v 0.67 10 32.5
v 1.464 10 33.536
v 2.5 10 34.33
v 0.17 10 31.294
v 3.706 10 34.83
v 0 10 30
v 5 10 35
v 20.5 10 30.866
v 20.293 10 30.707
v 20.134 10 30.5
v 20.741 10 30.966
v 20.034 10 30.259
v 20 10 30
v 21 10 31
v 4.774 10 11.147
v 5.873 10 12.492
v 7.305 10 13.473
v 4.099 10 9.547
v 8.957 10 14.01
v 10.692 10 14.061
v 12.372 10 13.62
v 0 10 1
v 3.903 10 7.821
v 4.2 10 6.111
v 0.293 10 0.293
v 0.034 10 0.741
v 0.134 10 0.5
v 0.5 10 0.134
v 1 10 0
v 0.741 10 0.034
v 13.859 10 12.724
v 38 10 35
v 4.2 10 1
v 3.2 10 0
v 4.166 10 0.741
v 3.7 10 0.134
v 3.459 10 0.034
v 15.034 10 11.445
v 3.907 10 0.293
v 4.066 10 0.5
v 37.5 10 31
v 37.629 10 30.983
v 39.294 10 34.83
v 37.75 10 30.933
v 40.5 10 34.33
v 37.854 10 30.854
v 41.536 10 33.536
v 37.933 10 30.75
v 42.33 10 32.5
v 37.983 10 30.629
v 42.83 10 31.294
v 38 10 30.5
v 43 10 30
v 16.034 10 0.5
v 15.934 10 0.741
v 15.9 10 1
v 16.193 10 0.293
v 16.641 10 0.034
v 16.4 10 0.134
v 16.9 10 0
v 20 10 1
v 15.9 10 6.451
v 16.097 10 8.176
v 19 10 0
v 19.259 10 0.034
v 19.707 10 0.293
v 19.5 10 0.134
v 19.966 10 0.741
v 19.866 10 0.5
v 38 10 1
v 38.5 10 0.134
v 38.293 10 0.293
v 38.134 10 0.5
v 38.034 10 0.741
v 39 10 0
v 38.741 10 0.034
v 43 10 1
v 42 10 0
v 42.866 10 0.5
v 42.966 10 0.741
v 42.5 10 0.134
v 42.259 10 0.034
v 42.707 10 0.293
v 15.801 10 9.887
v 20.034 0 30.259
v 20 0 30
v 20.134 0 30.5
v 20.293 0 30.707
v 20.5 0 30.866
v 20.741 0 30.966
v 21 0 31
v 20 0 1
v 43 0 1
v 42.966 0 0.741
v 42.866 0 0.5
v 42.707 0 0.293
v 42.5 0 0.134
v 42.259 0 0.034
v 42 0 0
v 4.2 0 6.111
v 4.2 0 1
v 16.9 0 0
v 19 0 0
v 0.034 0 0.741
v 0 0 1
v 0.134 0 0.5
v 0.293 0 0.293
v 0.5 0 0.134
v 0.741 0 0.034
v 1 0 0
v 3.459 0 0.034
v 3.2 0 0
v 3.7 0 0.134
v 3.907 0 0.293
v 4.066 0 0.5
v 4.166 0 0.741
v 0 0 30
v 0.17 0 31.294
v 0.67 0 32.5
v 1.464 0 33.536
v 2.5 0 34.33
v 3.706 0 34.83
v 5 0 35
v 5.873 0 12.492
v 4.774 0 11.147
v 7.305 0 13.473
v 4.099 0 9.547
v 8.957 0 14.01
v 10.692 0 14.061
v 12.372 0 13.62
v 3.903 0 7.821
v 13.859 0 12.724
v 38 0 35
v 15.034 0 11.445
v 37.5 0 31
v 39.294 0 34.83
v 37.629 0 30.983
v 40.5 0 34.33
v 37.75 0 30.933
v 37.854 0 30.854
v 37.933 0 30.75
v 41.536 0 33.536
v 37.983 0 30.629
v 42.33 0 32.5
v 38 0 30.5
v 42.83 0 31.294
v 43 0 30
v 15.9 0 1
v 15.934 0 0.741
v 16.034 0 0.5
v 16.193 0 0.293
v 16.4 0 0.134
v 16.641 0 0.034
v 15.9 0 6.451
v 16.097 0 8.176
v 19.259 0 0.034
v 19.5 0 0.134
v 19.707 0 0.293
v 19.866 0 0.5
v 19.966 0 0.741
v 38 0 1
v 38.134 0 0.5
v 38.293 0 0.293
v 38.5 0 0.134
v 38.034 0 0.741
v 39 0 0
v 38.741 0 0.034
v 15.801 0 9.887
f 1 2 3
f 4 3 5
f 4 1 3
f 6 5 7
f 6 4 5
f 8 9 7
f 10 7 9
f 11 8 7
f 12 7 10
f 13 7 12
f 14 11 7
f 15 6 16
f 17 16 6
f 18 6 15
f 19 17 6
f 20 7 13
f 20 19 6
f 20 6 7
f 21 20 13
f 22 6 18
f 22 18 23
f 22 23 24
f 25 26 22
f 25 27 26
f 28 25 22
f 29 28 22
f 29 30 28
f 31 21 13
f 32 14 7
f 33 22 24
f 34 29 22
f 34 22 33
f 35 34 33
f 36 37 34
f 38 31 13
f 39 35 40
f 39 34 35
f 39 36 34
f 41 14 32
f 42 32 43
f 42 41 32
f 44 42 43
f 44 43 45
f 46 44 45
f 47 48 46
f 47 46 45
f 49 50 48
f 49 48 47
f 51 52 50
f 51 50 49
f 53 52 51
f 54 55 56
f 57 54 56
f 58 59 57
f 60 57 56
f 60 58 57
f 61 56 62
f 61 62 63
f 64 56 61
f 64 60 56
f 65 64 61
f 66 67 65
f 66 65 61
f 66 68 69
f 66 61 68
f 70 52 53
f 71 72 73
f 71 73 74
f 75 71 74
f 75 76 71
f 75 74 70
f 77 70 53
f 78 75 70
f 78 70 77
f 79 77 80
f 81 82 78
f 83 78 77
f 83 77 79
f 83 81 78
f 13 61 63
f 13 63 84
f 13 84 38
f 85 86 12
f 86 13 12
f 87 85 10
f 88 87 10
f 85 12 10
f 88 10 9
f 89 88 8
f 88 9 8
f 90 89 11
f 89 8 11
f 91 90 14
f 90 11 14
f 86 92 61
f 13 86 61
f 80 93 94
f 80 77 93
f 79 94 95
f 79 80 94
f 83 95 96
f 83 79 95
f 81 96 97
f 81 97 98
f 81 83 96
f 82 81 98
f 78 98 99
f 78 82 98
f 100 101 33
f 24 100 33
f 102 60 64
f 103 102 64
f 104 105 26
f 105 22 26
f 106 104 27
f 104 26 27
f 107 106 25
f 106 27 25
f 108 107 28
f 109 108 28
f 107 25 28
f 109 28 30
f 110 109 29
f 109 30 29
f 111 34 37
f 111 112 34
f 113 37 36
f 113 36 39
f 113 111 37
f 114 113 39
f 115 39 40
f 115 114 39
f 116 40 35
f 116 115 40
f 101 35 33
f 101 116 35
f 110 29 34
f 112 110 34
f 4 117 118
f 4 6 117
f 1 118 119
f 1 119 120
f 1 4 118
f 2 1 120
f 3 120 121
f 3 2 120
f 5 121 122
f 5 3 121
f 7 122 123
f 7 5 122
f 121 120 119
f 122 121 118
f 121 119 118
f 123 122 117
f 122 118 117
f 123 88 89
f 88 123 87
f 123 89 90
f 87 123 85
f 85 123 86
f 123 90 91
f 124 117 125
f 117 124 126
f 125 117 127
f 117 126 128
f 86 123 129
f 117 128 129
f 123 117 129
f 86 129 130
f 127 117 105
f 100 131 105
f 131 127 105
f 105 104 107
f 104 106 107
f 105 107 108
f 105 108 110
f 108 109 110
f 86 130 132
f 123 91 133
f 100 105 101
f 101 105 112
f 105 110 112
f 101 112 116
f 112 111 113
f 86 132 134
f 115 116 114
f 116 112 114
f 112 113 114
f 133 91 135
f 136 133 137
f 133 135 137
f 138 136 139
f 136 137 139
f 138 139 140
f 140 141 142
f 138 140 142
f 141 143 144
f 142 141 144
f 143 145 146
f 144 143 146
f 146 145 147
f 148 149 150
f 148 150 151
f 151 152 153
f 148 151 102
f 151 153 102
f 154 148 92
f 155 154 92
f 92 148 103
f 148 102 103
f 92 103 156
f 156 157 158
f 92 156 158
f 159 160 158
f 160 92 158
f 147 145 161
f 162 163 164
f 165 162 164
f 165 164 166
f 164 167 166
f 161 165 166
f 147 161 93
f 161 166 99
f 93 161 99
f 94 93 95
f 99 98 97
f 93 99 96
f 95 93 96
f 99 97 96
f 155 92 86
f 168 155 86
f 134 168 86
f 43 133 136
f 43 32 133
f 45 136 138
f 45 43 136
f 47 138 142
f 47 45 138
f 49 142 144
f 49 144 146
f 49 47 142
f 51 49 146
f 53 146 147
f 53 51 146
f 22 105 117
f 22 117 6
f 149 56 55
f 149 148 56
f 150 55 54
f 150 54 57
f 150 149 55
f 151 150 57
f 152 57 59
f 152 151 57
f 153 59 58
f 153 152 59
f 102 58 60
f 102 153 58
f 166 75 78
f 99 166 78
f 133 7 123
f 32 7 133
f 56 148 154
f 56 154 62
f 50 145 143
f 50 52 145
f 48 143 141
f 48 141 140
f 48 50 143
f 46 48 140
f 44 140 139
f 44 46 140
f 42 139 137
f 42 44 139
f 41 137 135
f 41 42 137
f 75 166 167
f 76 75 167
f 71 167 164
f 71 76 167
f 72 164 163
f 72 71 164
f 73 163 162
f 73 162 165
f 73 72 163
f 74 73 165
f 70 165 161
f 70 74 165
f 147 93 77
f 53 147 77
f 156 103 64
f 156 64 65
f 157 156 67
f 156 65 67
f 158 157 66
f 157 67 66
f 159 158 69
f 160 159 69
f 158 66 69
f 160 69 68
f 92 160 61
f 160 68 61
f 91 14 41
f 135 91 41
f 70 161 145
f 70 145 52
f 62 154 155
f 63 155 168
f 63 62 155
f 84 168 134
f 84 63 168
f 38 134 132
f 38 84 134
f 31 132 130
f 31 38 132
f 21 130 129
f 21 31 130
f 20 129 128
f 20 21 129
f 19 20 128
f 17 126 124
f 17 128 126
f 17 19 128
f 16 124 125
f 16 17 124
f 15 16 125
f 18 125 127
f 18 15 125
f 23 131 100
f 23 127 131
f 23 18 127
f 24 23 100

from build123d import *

# Parameters (mm, degrees)
CYLINDER_R     = 6.1
CYLINDER_DEPTH = 15
BOX007_W       = 11.7
BOX007_H       = 15
BOX007_DEPTH   = 15
BOX_W          = 18
BOX_H          = 20
BOX_DEPTH      = 31
BOX002_W       = 43
BOX002_H       = 10
BOX002_DEPTH   = 35
FILLET_R       = 5
FILLET001_R    = 1
FILLET002_R    = 0.5


with BuildPart() as cylinder:
    # Cylinder → Cylinder (new body)
    with BuildSketch(Plane(origin=(10, 12, 8), x_dir=(1, 0, 0), z_dir=(0, -1, 0))):
        Circle(CYLINDER_R)
    extrude(amount=CYLINDER_DEPTH)


with BuildPart() as cube007:
    # Box007 → Box007 (new body)
    with BuildSketch(Plane(origin=(4.2, -3, -7), x_dir=(1, 0, 0), z_dir=(0, 0, 1))):
        with Locations((5.85, 7.5)):
            Rectangle(BOX007_W, BOX007_H)
    extrude(amount=BOX007_DEPTH)


with BuildPart() as cube:
    # Box → Box (new body)
    with BuildSketch(Plane(origin=(20, 0, 0), x_dir=(1, 0, 0), z_dir=(0, 0, 1))):
        with Locations((9, 10)):
            Rectangle(BOX_W, BOX_H)
    extrude(amount=BOX_DEPTH)


with BuildPart() as fillet002:
    # Box002 → Box002 (new body)
    with BuildSketch(Plane.XY):
        with Locations((21.5, 5)):
            Rectangle(BOX002_W, BOX002_H)
    extrude(amount=BOX002_DEPTH)

    # Cut: cut Cube
    add(cube.part, mode=Mode.SUBTRACT)

    # Cut001: cut Cube007
    add(cube007.part, mode=Mode.SUBTRACT)

    # Cut002: cut Cylinder
    add(cylinder.part, mode=Mode.SUBTRACT)

    # Fillet
    fillet_edges = [fillet002.edges().sort_by_distance(p)[0] for p in [
        (0, 5, 35),
        (43, 5, 35),
    ]]
    fillet(fillet_edges, radius=FILLET_R)

    # Fillet001
    fillet001_edges = [fillet002.edges().sort_by_distance(p)[0] for p in [
        (0, 5, 0),
        (4.2, 5, 0),
        (43, 5, 0),
        (38, 5, 0),
        (20, 5, 31),
        (20, 5, 0),
        (15.9, 5, 0),
    ]]
    fillet(fillet001_edges, radius=FILLET001_R)

    # Fillet002
    fillet002_edges = [fillet002.edges().sort_by_distance(p)[0] for p in [
        (38, 5, 31),
    ]]
    fillet(fillet002_edges, radius=FILLET002_R)


solid = fillet002.part
